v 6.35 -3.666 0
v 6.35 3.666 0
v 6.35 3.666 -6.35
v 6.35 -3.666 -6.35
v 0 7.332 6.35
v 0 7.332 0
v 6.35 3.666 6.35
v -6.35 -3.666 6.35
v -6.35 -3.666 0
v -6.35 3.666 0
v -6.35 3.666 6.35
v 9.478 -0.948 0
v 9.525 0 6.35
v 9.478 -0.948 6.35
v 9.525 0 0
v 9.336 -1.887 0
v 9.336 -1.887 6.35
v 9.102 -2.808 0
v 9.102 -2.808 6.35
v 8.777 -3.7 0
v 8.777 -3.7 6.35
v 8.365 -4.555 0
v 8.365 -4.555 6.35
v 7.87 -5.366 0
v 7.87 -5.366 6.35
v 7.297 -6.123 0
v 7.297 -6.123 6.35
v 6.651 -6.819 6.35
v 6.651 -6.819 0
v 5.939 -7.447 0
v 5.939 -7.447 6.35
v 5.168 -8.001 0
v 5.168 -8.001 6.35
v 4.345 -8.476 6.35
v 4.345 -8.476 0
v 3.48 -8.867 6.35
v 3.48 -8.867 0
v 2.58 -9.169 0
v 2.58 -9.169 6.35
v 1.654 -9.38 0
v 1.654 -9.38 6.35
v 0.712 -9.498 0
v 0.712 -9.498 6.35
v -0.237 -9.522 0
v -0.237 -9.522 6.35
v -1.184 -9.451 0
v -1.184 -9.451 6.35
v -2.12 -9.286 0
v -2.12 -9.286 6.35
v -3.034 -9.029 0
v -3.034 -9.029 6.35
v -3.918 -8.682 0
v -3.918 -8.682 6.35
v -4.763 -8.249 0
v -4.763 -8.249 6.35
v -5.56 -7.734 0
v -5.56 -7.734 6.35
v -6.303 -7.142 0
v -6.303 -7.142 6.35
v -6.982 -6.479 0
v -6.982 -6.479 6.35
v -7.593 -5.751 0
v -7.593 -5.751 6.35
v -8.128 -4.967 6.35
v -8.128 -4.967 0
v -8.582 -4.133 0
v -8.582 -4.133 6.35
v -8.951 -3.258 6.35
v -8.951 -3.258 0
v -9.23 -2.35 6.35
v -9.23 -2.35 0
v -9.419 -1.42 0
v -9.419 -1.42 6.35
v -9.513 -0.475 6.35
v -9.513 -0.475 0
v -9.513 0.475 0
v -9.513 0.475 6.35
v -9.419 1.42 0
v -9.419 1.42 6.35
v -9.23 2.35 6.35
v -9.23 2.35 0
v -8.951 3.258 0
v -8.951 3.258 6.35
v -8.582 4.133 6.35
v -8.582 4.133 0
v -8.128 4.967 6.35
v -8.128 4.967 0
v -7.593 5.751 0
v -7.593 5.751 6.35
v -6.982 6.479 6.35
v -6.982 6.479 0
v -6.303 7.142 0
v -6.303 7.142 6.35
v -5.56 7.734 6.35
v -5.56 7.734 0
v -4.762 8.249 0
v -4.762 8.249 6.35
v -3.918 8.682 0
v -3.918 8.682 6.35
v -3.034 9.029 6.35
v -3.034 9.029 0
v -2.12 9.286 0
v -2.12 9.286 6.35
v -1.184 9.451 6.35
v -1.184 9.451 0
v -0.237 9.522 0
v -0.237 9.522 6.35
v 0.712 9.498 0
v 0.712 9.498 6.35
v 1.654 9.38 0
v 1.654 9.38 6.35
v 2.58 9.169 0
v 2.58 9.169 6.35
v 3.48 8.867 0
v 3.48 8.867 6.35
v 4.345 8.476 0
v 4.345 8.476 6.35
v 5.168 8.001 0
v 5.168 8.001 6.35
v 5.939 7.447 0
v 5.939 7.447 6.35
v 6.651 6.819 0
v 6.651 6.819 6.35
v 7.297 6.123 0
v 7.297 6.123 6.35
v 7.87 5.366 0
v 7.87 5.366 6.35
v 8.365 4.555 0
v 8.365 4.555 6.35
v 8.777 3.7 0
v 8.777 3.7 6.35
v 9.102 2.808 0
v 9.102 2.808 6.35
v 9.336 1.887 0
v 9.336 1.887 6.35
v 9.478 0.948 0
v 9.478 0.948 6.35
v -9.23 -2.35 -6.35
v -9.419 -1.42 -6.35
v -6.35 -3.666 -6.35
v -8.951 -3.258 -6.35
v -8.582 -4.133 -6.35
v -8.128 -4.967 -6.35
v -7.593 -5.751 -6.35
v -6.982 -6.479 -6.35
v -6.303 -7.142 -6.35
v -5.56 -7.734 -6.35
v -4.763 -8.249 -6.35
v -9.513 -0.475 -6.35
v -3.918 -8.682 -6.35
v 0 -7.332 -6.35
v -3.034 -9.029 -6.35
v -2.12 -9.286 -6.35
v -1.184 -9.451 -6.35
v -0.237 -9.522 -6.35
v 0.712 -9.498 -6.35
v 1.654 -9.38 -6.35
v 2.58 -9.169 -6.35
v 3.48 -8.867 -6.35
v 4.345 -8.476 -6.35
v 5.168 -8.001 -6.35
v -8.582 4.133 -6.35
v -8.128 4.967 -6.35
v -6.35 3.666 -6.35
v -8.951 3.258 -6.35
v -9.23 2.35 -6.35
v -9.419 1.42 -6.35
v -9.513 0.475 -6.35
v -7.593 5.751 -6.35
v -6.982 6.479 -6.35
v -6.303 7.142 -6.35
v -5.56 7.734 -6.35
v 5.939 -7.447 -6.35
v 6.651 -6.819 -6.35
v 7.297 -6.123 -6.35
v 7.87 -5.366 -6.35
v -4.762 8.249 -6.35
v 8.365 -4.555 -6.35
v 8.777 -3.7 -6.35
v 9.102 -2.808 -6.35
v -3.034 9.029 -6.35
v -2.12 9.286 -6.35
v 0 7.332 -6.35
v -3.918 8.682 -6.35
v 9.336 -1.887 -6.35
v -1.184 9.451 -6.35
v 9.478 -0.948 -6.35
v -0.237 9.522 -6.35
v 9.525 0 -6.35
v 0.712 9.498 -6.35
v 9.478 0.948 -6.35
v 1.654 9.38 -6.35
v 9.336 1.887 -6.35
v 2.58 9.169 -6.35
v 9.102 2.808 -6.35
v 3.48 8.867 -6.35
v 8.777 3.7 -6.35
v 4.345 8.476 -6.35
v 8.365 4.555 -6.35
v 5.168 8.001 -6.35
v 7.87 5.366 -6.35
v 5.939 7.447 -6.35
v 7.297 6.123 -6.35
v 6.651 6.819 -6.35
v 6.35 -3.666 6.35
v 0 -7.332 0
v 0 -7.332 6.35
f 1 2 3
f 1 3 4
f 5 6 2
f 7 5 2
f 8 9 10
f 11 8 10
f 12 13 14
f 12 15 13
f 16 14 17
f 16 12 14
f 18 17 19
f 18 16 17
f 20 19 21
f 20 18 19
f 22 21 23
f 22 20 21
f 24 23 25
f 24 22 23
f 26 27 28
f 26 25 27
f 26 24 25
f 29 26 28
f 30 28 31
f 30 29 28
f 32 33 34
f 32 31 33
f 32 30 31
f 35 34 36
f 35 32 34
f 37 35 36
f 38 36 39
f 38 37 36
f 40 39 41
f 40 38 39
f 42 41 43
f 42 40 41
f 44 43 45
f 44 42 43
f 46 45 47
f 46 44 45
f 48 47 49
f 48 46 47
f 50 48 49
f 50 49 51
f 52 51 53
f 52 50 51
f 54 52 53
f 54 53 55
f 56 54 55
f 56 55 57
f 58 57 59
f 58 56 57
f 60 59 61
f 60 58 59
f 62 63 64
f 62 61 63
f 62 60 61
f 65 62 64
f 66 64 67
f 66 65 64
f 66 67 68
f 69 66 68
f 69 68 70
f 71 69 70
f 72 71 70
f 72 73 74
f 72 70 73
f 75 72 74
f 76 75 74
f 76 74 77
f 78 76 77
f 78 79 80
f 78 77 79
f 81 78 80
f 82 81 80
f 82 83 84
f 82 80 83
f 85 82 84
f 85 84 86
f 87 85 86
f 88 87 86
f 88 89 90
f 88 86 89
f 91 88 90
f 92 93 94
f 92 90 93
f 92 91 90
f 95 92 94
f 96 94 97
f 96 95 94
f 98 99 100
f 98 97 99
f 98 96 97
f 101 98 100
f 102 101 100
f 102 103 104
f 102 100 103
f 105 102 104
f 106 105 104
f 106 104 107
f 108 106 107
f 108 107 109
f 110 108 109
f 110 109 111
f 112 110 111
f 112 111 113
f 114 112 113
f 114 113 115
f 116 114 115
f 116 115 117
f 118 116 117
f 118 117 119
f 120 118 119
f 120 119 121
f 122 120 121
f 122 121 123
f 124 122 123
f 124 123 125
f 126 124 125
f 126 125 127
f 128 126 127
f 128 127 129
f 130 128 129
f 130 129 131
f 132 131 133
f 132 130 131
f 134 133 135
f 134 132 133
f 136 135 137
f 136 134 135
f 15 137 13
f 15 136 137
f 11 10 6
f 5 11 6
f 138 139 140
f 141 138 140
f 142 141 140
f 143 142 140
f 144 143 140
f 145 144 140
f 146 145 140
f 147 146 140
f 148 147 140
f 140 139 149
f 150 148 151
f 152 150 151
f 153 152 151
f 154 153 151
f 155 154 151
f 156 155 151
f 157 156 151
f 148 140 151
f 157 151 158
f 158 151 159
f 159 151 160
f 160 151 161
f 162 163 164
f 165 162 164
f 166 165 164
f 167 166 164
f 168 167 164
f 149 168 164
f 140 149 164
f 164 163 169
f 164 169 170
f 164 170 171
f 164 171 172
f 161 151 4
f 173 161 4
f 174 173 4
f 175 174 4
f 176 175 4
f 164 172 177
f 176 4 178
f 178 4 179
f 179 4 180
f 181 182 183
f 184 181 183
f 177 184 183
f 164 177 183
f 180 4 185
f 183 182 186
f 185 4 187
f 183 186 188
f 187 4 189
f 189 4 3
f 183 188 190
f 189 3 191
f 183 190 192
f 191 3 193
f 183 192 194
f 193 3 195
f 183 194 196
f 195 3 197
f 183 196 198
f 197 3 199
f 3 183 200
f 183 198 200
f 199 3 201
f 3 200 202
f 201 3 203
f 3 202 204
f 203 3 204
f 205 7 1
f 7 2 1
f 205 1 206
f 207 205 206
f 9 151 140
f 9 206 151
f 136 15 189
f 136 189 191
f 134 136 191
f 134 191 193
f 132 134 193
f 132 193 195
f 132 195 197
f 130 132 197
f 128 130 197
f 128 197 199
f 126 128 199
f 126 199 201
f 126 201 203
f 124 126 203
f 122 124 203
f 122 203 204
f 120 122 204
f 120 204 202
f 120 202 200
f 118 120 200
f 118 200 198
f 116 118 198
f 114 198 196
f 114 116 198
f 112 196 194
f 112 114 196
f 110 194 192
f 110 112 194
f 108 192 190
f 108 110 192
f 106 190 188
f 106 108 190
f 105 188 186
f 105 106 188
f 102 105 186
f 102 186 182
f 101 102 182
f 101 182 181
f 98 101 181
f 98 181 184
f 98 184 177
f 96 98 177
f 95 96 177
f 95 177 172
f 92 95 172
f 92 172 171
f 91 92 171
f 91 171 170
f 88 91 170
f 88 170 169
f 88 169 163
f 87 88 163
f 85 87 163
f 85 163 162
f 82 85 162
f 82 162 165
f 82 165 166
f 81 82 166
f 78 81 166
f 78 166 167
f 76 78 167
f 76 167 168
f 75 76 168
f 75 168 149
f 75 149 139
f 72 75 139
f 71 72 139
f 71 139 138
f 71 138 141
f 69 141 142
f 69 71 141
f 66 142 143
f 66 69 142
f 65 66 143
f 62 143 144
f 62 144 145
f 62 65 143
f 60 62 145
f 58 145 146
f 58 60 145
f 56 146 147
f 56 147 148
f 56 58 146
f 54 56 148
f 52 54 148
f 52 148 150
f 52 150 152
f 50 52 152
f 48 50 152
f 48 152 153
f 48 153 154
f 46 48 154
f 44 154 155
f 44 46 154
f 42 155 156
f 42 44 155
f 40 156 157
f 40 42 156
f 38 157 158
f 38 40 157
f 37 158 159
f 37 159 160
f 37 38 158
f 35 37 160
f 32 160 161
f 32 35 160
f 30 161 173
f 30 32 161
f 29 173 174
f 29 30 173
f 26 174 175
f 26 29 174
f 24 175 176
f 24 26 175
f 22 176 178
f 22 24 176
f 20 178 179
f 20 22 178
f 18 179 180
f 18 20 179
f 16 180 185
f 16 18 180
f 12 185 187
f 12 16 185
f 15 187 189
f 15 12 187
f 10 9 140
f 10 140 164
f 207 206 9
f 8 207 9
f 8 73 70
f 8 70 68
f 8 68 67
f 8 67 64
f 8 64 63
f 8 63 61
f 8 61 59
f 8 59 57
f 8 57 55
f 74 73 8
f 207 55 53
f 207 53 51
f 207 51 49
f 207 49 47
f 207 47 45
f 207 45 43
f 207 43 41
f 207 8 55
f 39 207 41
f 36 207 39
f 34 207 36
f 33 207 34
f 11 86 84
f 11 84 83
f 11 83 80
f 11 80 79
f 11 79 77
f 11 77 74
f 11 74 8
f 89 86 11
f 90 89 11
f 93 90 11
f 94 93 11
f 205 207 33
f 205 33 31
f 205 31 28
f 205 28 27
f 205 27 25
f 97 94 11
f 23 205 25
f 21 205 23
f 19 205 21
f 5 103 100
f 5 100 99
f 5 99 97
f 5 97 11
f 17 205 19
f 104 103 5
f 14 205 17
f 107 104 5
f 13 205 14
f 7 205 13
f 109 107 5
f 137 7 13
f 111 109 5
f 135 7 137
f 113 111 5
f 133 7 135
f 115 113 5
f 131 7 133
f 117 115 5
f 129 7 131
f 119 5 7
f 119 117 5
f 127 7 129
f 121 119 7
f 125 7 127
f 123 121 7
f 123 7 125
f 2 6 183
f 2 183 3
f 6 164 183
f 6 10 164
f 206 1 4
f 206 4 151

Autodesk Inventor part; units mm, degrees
ref_plane "YZ Plane" through (0, 0, 0) normal (1, 0, 0) x (0, 1, 0)
ref_plane "XZ Plane" through (0, 0, 0) normal (0, 1, 0) x (-1, 0, 0)
ref_plane "XY Plane" through (0, 0, 0) normal (0, 0, 1) x (1, 0, 0)
sketch "Sketch1" plane through (0, 0, 0) normal (0, 0, 1) x (1, 0, 0)
  circle A0 centre (0, 0) radius 9.525
  line L0 (0, -7.3323) -> (-6.35, -3.6662)
  line L1 (-6.35, -3.6662) -> (-6.35, 3.6662)
  line L2 (-6.35, 3.6662) -> (0, 7.3323)
  line L3 (0, 7.3323) -> (6.35, 3.6662)
  line L4 (6.35, 3.6662) -> (6.35, -3.6662)
  line L5 (6.35, -3.6662) -> (0, -7.3323)
  dimension "d0" = 19.05
  dimension "d1" = 12.7
extrude "Extrusion1" add sketch "Sketch1" along normal mid plane 12.7
properties part number "500 Hex Spacer 0.5"
